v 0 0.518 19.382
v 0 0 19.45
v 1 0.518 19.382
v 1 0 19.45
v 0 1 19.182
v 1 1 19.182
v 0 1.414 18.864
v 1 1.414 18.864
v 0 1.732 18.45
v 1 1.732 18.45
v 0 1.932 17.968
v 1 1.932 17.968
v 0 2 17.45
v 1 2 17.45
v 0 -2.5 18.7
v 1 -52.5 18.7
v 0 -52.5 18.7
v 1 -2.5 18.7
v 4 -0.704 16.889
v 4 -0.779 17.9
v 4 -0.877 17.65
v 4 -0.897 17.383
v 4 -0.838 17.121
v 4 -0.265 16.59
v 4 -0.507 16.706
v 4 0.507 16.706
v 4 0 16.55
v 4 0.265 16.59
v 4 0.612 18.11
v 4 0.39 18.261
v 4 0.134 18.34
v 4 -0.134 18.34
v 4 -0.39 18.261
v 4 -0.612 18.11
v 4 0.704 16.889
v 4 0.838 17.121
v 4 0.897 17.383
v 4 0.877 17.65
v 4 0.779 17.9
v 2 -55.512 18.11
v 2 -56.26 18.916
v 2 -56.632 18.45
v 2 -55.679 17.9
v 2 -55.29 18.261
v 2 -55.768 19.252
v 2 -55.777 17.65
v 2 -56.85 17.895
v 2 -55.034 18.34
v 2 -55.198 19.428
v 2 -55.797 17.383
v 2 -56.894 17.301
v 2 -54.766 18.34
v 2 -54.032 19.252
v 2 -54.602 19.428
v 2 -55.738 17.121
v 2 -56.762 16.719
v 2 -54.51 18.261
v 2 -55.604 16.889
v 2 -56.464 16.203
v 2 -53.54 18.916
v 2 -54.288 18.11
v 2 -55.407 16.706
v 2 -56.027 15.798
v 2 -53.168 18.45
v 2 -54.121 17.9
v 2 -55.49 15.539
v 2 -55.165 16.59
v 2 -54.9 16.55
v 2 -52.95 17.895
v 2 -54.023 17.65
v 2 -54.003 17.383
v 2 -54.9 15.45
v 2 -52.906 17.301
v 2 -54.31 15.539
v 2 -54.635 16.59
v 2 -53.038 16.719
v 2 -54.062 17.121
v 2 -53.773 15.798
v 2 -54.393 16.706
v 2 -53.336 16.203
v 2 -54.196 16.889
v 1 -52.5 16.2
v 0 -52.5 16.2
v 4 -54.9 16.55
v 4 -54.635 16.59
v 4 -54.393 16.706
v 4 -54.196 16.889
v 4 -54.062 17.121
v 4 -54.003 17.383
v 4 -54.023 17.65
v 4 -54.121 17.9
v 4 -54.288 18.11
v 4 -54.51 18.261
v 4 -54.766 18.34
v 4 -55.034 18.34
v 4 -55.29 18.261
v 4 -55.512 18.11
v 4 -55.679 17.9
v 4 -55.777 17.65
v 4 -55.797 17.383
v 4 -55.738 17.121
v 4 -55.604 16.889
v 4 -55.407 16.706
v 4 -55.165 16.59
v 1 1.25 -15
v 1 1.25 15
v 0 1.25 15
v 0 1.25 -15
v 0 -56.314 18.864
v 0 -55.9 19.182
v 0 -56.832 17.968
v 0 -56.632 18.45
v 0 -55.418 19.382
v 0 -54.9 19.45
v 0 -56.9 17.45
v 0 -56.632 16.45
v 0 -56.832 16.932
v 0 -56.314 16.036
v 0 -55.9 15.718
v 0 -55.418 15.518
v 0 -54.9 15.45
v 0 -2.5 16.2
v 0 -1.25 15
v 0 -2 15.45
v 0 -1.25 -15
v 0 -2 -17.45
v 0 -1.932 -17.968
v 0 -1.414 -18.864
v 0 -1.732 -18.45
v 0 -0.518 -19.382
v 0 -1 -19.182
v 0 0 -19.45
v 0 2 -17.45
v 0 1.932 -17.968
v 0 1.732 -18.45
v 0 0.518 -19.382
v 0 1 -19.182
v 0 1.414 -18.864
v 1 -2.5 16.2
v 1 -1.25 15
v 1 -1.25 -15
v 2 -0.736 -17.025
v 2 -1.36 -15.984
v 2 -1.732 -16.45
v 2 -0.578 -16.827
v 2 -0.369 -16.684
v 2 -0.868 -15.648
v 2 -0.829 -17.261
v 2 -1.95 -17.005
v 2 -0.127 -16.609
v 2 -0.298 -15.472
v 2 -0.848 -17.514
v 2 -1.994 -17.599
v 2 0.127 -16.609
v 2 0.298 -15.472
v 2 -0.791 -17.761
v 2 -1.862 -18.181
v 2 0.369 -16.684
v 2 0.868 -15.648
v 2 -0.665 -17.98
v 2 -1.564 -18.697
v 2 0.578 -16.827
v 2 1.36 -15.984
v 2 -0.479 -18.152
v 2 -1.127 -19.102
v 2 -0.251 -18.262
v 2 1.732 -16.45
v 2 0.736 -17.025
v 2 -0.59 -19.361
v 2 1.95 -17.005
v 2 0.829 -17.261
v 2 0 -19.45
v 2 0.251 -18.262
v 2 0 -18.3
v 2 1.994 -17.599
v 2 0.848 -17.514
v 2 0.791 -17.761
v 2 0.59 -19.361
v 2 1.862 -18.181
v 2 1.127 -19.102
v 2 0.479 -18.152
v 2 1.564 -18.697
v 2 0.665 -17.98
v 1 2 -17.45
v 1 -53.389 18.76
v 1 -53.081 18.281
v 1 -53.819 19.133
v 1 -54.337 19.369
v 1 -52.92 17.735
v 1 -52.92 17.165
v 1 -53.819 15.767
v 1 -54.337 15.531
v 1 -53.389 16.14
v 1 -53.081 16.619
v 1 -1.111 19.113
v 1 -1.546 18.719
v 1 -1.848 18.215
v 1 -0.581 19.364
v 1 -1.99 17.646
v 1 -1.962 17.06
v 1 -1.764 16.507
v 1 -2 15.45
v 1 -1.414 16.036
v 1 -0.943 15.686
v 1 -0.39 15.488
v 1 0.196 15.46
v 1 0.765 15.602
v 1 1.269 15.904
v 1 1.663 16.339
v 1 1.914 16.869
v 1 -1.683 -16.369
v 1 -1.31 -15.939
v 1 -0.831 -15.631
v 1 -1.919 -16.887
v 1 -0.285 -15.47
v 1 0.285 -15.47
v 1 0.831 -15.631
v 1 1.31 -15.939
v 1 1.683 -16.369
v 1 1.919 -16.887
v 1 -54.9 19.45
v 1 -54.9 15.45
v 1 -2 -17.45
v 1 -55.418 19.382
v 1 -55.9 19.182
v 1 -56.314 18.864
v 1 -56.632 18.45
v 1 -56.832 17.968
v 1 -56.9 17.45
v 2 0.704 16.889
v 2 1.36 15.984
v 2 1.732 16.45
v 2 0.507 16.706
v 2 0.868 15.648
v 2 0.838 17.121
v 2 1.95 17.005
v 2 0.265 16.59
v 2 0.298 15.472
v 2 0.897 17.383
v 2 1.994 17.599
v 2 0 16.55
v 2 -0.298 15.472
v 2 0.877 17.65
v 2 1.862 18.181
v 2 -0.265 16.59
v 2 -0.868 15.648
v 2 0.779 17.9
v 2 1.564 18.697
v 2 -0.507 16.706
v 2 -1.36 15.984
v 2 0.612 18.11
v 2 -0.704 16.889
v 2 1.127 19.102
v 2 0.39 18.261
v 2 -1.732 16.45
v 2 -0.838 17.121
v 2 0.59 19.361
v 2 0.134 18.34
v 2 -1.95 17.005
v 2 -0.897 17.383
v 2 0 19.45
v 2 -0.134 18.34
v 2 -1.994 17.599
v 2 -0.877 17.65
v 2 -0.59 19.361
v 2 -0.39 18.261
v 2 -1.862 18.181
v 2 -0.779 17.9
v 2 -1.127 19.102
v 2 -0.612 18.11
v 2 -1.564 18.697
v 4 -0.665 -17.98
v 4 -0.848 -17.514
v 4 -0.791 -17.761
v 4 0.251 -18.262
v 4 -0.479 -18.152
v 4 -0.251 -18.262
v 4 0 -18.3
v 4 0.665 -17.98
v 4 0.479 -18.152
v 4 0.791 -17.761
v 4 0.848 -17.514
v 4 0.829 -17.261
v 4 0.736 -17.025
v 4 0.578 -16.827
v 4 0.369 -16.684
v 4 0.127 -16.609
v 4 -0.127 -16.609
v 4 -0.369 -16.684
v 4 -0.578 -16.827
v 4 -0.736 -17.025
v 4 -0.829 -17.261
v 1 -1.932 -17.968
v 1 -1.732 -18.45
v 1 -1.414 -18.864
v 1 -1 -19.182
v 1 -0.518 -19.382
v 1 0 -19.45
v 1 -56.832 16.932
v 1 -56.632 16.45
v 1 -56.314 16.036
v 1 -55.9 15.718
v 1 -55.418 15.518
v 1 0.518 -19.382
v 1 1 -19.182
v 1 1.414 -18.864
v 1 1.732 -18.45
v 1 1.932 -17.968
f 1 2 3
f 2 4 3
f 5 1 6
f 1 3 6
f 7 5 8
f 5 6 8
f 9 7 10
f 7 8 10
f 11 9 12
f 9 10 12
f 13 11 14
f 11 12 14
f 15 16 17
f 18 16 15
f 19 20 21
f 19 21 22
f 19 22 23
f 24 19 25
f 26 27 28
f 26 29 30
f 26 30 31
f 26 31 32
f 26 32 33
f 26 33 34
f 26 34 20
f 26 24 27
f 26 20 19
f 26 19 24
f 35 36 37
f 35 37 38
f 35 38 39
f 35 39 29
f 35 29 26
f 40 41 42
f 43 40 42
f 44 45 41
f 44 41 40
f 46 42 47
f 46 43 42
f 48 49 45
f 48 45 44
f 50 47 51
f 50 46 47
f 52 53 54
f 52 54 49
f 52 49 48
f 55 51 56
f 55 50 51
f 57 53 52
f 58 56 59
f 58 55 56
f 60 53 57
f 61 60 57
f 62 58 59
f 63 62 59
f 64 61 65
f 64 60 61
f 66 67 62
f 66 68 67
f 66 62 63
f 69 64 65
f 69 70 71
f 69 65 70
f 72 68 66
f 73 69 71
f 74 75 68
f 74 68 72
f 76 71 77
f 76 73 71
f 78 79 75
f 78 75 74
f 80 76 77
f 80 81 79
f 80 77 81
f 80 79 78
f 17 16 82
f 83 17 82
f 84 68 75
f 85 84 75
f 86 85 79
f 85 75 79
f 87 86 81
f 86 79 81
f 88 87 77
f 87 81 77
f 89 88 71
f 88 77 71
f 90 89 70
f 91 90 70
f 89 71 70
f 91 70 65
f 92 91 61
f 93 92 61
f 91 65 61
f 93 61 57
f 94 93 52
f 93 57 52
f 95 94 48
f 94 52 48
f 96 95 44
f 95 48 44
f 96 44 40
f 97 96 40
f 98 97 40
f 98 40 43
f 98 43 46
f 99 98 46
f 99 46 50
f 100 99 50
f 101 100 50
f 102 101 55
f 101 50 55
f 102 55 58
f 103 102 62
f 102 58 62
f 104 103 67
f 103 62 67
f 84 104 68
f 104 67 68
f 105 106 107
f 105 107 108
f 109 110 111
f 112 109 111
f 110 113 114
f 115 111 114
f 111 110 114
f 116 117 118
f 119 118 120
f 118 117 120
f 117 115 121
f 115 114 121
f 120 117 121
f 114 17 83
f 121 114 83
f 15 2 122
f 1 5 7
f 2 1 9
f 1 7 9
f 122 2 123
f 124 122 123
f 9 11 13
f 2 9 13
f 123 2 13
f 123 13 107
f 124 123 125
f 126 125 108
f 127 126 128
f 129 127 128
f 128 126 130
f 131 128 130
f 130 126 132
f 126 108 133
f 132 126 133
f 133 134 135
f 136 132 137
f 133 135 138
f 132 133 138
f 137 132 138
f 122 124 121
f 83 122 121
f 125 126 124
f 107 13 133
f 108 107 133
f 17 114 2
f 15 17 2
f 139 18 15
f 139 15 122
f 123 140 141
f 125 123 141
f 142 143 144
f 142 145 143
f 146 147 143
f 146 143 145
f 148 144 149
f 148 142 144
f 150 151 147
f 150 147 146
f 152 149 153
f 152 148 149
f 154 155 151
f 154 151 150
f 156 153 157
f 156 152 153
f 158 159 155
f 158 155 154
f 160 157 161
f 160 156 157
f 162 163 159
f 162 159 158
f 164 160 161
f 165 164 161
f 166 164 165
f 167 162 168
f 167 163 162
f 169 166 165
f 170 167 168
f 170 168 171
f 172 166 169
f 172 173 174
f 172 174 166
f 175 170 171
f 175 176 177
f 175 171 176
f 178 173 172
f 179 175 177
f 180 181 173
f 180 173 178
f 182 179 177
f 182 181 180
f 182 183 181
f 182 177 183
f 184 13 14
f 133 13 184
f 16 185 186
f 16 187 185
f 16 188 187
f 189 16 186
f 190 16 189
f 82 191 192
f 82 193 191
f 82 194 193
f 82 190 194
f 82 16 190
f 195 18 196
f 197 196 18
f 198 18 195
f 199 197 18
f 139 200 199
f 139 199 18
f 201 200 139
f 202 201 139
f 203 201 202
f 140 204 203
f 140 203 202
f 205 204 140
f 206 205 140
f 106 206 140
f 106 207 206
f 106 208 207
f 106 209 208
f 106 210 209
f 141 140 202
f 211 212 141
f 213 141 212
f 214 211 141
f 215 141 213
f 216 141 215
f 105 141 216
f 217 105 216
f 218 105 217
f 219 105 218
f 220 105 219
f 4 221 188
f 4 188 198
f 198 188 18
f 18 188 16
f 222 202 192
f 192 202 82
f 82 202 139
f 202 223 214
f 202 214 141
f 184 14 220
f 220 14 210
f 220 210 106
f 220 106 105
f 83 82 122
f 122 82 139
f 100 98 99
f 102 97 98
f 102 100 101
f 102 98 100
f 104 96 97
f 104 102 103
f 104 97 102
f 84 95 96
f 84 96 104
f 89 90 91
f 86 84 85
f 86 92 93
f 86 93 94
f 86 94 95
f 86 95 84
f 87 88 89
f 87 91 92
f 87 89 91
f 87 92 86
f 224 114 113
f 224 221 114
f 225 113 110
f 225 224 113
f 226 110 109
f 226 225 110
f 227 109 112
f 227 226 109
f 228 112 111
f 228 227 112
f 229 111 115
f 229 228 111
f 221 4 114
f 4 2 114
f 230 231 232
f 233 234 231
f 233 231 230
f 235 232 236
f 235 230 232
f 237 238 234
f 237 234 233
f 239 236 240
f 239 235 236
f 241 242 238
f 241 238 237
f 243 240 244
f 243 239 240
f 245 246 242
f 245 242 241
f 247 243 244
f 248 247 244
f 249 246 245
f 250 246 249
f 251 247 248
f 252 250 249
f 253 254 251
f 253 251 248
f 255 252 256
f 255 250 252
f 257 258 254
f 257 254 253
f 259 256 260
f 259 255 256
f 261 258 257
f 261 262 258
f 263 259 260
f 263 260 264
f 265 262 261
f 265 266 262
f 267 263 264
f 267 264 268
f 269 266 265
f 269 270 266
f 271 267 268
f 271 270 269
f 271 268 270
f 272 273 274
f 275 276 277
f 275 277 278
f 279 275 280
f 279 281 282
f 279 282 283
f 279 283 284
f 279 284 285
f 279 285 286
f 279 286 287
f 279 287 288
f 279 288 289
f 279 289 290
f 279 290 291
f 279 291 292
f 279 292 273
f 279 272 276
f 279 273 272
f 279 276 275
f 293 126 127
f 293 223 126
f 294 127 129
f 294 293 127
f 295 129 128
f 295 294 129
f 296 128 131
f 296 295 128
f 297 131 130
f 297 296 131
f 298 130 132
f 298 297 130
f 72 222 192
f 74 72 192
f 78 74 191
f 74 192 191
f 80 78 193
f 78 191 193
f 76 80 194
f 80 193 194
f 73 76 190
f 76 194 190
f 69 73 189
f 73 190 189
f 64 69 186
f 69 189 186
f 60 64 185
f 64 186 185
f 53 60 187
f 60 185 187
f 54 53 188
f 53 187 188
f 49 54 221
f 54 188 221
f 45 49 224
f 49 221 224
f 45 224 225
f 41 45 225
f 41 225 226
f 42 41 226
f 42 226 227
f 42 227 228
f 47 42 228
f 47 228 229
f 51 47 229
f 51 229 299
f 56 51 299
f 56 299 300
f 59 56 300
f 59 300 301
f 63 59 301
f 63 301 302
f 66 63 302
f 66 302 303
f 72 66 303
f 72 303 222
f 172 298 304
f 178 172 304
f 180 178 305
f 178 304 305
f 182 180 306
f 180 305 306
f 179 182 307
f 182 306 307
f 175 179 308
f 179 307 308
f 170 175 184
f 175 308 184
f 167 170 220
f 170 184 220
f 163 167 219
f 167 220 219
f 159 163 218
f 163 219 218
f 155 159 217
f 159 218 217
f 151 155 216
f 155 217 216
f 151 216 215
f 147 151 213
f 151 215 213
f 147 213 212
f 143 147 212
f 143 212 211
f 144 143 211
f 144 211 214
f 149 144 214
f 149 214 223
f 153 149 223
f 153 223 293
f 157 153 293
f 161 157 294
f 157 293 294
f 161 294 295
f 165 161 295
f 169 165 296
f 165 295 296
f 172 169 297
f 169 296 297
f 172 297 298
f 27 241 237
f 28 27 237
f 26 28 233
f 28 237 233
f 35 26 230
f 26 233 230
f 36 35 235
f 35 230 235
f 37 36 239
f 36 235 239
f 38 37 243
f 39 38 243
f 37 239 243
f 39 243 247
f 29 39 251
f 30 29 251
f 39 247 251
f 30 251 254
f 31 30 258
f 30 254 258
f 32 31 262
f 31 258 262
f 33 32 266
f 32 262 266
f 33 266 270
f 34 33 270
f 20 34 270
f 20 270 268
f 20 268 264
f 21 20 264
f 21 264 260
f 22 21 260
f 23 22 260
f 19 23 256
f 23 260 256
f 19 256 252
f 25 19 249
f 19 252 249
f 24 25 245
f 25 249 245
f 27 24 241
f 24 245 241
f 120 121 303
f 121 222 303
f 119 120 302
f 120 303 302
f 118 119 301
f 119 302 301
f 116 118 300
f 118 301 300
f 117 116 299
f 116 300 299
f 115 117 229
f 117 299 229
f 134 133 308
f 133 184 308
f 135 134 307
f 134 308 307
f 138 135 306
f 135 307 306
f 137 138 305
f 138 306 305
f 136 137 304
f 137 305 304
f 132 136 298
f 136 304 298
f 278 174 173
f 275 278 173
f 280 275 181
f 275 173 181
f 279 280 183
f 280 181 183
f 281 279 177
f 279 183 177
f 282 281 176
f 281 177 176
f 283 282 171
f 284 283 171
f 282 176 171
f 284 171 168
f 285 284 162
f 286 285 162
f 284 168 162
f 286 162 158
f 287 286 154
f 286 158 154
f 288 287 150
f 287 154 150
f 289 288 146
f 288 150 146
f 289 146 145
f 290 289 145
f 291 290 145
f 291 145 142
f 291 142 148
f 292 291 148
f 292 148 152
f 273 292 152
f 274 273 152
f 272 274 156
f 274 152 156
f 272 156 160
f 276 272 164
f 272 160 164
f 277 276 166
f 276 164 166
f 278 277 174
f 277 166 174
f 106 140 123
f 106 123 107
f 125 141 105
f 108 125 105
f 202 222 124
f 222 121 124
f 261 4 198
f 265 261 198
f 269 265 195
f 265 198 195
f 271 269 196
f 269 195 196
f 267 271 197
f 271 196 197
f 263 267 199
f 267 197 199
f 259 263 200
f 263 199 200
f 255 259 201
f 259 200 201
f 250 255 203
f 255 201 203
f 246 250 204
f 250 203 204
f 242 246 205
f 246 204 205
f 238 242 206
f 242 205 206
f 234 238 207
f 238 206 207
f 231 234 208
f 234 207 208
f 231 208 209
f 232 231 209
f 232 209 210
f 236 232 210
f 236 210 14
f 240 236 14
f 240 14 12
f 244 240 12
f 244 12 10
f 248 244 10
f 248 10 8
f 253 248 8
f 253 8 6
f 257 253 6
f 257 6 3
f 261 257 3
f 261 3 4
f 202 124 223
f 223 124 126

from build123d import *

# Parameters (mm, degrees)
SKETCH1_W           = 4
SKETCH1_H           = 54.9
SKETCH1_W_2         = 38.9
SKETCH1_H_2         = 4
BOSS_EXTRUDE1_DEPTH = 1
SKETCH2_R           = 2
BOSS_EXTRUDE2_DEPTH = 1
SKETCH3_R           = 0.9
SKETCH3_R_2         = 0.85
BOSS_EXTRUDE3_DEPTH = 2
SKETCH4_W           = 30
SKETCH4_H           = 2.5
SKETCH4_W_2         = 2.5
SKETCH4_H_2         = 50
CUT_EXTRUDE1_DEPTH  = 1
FILLET1_R           = 2


with BuildPart() as part:
    # Sketch1 → Boss-Extrude1 (new body)
    with BuildSketch(Plane(origin=(0, 0, 0), x_dir=(0, 0, -1), z_dir=(1, 0, 0))):
        with Locations((-17.45, -29.45)):
            Rectangle(SKETCH1_W, SKETCH1_H)
        Rectangle(SKETCH1_W_2, SKETCH1_H_2)
    extrude(amount=BOSS_EXTRUDE1_DEPTH)

    # Sketch2 → Boss-Extrude2 (add)
    with BuildSketch(Plane(origin=(1, 0, 0), x_dir=(0, 0, -1), z_dir=(1, 0, 0))):
        with Locations(Location((-17.45, 0, 0), (0, 0, 180))):
            Circle(SKETCH2_R)
        with Locations((17.45, 0)):
            Circle(SKETCH2_R)
        with Locations((-17.45, -54.9)):
            Circle(SKETCH2_R)
    extrude(amount=BOSS_EXTRUDE2_DEPTH)

    # Sketch3 → Boss-Extrude3 (add)
    with BuildSketch(Plane(origin=(2, 0, 0), x_dir=(0, 0, -1), z_dir=(1, 0, 0))):
        with Locations((-17.45, 0)):
            Circle(SKETCH3_R)
        with Locations((17.45, 0)):
            Circle(SKETCH3_R_2)
        with Locations((-17.45, -54.9)):
            Circle(SKETCH3_R)
    extrude(amount=BOSS_EXTRUDE3_DEPTH)

    # Sketch4 → Cut-Extrude1 (cut)
    with BuildSketch(Plane(origin=(1, 0, 0), x_dir=(0, 0, -1), z_dir=(1, 0, 0))):
        Rectangle(SKETCH4_W, SKETCH4_H)
        with Locations((-17.45, -27.5)):
            Rectangle(SKETCH4_W_2, SKETCH4_H_2)
    extrude(amount=-CUT_EXTRUDE1_DEPTH, mode=Mode.SUBTRACT)

    # Fillet1
    fillet1_edges = [part.edges().sort_by_distance(p)[0] for p in [
        (0.5, 2, 19.45),
        (0.5, 2, -19.45),
        (0.5, -2, -19.45),
        (0.5, -56.9, 15.45),
        (0.5, -56.9, 19.45),
    ]]
    fillet(fillet1_edges, radius=FILLET1_R - 0.0001)  # a hair under: the kernel refuses the full size


solid = part.part
